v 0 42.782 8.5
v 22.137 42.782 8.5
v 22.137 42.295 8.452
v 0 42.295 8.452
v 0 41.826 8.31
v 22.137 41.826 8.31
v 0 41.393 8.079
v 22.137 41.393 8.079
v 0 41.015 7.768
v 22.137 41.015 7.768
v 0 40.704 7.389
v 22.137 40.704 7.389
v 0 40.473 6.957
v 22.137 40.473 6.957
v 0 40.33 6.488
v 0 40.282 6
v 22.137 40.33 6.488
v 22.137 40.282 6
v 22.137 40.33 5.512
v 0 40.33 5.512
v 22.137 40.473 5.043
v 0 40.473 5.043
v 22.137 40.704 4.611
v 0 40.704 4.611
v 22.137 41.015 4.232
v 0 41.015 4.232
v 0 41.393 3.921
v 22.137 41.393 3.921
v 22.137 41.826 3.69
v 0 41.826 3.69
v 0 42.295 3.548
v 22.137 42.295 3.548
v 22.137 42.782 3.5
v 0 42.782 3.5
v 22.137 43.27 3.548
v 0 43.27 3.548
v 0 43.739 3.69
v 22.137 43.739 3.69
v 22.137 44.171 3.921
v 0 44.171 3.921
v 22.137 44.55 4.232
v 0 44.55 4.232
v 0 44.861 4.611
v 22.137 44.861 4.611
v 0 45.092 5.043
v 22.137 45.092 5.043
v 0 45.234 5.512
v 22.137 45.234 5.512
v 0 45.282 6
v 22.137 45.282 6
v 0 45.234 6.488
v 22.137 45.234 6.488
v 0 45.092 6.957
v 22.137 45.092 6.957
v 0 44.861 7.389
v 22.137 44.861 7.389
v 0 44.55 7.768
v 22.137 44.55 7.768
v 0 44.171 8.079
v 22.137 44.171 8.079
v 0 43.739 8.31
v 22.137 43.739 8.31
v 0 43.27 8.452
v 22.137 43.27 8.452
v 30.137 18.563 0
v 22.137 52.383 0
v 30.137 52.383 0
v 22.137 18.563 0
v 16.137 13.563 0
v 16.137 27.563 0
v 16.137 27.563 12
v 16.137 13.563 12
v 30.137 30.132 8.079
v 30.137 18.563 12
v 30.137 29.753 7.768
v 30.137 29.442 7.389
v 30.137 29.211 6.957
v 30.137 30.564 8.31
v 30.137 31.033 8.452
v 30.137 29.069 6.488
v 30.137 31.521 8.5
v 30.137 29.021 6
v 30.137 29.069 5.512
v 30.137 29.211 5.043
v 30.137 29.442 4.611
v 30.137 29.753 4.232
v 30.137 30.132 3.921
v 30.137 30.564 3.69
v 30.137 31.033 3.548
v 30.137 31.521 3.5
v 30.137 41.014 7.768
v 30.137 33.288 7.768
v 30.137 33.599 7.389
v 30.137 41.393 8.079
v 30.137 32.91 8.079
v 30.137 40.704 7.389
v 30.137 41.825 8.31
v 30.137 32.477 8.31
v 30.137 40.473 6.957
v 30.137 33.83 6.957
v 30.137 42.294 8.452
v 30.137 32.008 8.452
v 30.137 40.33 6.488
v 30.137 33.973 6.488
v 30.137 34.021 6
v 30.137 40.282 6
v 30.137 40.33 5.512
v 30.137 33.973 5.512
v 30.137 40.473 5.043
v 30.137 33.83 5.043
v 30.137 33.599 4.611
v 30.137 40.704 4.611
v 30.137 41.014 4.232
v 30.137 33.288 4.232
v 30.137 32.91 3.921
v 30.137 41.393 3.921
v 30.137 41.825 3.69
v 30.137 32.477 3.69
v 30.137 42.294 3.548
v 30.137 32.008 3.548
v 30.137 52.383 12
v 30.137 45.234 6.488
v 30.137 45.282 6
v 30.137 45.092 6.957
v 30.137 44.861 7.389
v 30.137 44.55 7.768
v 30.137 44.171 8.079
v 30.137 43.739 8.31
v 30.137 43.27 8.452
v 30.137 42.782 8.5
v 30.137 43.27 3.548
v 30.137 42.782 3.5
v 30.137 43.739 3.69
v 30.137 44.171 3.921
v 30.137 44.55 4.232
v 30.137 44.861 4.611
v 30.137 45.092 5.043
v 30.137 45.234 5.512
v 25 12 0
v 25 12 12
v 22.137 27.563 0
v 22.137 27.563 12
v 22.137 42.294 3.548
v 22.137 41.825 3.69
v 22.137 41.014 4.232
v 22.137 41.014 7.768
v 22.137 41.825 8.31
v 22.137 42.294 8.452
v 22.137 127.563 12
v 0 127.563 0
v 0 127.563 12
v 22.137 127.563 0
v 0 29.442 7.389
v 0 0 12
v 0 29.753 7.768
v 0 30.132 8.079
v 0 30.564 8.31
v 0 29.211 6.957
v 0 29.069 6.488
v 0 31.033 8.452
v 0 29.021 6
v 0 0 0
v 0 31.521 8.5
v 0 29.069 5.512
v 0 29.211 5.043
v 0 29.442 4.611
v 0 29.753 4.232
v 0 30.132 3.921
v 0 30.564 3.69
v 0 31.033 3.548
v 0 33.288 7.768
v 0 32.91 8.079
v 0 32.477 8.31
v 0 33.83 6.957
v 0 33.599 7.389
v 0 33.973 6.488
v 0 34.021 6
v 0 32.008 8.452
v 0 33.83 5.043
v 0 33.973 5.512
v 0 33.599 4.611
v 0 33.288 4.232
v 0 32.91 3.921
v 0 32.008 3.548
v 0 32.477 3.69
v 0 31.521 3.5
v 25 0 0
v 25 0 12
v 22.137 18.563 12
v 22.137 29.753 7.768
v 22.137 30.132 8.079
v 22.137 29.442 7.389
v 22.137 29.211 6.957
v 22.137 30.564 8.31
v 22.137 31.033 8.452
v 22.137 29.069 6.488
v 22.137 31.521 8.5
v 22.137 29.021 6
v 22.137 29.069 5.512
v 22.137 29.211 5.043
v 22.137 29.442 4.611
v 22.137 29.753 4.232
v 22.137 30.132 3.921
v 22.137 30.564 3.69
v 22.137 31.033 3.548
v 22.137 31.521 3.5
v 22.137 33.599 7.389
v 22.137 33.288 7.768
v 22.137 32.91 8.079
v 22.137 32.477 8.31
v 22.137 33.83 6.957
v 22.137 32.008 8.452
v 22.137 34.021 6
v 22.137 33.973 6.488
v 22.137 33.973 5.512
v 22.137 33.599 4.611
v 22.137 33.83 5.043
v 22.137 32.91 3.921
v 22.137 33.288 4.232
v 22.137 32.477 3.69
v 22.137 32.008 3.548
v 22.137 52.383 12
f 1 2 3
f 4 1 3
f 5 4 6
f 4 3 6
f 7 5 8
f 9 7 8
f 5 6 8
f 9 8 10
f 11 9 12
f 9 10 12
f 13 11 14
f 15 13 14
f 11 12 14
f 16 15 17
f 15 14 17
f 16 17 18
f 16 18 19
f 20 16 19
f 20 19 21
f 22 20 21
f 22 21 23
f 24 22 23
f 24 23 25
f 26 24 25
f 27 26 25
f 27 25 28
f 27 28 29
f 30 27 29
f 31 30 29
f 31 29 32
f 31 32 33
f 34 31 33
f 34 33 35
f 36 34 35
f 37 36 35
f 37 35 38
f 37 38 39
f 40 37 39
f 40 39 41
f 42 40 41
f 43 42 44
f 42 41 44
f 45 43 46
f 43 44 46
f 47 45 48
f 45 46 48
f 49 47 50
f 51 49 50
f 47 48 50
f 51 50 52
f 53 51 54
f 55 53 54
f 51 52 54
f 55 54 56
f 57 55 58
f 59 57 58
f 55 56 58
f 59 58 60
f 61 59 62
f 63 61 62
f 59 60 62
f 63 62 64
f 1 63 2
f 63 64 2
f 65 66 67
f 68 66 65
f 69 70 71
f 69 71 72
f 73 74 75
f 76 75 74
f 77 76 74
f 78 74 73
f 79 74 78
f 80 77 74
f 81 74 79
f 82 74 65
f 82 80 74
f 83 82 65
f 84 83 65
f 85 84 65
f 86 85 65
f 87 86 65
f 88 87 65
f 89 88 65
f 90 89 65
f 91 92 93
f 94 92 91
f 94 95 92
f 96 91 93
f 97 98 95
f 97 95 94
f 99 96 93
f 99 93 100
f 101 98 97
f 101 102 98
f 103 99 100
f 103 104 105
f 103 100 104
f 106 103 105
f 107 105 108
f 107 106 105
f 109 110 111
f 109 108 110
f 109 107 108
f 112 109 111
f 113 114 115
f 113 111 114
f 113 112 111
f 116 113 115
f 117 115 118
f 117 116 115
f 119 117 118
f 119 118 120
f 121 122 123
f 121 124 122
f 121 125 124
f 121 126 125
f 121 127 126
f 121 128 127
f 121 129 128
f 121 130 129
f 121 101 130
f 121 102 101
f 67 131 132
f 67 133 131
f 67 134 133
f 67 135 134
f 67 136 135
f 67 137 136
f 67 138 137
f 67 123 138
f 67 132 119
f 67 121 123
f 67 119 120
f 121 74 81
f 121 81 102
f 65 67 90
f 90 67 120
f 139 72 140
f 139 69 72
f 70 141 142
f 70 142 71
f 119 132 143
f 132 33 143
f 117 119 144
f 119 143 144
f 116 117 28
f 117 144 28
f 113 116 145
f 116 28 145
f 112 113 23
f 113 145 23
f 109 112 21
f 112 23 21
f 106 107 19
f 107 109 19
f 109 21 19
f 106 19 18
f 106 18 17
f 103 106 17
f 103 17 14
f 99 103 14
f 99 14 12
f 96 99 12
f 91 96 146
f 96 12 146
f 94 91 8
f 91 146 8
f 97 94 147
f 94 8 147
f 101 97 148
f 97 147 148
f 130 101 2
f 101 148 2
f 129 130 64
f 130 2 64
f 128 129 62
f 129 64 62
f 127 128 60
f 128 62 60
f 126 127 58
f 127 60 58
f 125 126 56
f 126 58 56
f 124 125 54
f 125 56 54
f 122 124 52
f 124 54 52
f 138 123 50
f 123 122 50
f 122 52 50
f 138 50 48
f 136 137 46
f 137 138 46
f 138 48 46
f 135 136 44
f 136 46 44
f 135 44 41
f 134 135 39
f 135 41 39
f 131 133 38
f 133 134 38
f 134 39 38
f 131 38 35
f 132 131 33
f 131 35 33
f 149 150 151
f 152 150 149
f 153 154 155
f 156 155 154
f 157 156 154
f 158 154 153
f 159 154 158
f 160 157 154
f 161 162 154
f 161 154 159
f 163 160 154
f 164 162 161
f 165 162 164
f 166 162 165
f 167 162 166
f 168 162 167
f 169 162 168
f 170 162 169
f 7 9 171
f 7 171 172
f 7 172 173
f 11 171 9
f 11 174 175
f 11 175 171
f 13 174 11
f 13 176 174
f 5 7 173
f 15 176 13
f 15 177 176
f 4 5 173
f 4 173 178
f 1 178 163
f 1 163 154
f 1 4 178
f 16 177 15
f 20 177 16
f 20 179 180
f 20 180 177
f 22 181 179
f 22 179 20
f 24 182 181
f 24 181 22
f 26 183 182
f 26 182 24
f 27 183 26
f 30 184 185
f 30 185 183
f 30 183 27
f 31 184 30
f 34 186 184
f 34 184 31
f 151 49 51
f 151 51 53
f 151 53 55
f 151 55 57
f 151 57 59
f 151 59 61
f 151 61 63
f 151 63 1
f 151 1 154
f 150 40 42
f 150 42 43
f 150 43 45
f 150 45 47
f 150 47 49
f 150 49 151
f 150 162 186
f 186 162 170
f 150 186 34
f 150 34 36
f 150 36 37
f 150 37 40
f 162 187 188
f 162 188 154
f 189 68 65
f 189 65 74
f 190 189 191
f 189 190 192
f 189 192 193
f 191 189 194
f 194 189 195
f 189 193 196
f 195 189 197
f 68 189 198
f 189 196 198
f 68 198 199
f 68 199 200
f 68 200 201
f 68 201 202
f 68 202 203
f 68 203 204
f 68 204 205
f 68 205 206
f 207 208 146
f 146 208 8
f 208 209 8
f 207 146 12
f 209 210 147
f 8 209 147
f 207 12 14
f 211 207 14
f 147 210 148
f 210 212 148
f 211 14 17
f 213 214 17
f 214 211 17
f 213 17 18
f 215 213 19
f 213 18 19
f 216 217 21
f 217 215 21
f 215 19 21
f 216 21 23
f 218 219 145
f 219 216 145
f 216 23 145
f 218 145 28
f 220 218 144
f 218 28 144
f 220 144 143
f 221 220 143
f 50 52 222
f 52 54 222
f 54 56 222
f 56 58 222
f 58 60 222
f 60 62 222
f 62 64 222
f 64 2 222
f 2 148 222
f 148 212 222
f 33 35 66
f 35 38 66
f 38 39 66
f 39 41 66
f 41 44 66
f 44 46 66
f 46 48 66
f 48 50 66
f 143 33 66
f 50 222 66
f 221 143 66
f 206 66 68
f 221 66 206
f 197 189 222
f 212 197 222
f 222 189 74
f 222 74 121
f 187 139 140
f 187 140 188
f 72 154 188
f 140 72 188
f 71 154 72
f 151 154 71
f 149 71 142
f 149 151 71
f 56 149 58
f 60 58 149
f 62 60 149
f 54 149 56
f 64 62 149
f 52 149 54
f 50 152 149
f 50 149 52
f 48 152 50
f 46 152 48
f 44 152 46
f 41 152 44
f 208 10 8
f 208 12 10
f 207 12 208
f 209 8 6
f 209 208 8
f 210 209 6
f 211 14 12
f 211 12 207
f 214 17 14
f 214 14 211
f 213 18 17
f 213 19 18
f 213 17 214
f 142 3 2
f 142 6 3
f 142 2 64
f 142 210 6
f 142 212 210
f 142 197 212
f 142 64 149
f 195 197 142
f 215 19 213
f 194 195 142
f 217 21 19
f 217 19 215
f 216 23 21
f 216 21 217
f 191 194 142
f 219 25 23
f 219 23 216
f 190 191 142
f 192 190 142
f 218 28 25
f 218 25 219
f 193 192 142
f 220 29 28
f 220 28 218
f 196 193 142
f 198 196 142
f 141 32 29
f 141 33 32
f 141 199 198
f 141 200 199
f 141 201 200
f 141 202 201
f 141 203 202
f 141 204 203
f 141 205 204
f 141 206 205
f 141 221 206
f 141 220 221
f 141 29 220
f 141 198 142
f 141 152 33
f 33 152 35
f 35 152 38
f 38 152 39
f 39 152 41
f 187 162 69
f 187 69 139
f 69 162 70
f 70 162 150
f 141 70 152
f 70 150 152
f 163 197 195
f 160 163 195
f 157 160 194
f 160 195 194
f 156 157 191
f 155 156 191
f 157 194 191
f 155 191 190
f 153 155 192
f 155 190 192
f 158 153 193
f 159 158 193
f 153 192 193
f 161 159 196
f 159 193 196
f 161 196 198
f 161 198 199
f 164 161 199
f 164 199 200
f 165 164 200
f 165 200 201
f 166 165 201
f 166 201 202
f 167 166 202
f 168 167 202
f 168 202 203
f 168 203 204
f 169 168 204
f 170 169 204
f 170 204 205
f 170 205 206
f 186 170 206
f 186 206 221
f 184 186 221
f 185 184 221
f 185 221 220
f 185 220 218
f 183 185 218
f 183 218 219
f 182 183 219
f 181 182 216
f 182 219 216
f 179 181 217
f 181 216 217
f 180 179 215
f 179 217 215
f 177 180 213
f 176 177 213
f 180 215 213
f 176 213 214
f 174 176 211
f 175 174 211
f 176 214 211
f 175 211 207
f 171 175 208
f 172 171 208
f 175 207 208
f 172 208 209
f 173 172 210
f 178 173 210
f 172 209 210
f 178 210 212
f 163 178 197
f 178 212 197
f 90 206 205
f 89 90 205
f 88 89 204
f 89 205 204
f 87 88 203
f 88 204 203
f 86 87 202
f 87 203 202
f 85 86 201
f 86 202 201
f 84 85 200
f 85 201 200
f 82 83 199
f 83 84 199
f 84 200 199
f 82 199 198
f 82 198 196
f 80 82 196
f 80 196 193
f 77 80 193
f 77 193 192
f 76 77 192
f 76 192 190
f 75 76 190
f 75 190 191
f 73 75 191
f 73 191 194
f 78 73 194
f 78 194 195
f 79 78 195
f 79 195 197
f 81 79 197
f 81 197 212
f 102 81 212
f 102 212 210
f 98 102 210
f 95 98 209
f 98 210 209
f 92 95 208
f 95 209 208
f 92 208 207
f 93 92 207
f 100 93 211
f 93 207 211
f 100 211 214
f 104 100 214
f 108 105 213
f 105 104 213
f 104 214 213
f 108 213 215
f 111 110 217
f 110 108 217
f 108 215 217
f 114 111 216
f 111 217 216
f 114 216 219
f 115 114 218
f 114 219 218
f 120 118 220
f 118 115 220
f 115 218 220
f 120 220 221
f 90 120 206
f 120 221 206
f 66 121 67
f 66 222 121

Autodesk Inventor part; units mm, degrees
ref_plane "YZ Plane" through (0, 0, 0) normal (1, 0, 0) x (0, 1, 0)
ref_plane "XZ Plane" through (0, 0, 0) normal (0, 1, 0) x (-1, 0, 0)
ref_plane "XY Plane" through (0, 0, 0) normal (0, 0, 1) x (1, 0, 0)
sketch "Sketch1" plane through (0, 0, 0) normal (0, 0, 1) x (1, 0, 0)
  line L0 (0, 0) -> (0, 127.5628)
  line L1 (0, 127.5628) -> (22.1367, 127.5628)
  line L2 (22.1367, 27.5628) -> (16.1367, 27.5628)
  line L3 (16.1367, 27.5628) -> (16.1367, 13.5628)
  line L4 (25, 12) -> (25, 0)
  line L5 (25, 0) -> (0, 0)
  line L6 (22.1367, 127.5628) -> (22.1367, 27.5628)
  line L7 (16.1367, 13.5628) -> (25, 12)
  dimension "d1" = 14
  dimension "d2" = 6
  dimension "d3" = 12
  dimension "d4" = 100
  dimension "d5" = 9
  dimension "d6" = 25
  dimension "d9" = 100
extrude "Extrusion1" add sketch "Sketch1" along normal blind 12
sketch "Sketch2" plane through (22.1367, 27.5628, 0) normal (1, 0, 0) x (0, 0, -1)
  line L0 (0, 0) -> (-12, 0) construction
  line L1 (-12, 24.8201) -> (0, 24.8201)
  line L2 (0, 24.8201) -> (0, -9)
  line L3 (0, -9) -> (-12, -9)
  line L4 (-12, -9) -> (-12, 24.8201)
  line L5 (-6, 0) -> (-6, 34.7527) construction
  circle A0 centre (-6, 15.2194) radius 2.5
  circle A1 centre (-6, 3.9579) radius 2.5
  point P0 (0, -27.5628)
  dimension "d11" = 9
  dimension "d12" = 5
  dimension "d13" = 5
extrude "Extrusion2" add sketch "Sketch2" along normal blind 8 separate body
sketch "Sketch3" plane through (0, 0, 0) normal (-1, 0, 0) x (0, 0, 1)
  circle A0 centre (6, 42.7823) radius 2.5 projected
  circle A1 centre (6, 31.5207) radius 2.5 projected
  point P0 (0, 0)
hole "Hole1" at (0, 31.5207, 6) at (0, 42.7823, 6) direction (1, 0, 0) diameter 5 end through all bodies 1
properties part number "RimKey"
